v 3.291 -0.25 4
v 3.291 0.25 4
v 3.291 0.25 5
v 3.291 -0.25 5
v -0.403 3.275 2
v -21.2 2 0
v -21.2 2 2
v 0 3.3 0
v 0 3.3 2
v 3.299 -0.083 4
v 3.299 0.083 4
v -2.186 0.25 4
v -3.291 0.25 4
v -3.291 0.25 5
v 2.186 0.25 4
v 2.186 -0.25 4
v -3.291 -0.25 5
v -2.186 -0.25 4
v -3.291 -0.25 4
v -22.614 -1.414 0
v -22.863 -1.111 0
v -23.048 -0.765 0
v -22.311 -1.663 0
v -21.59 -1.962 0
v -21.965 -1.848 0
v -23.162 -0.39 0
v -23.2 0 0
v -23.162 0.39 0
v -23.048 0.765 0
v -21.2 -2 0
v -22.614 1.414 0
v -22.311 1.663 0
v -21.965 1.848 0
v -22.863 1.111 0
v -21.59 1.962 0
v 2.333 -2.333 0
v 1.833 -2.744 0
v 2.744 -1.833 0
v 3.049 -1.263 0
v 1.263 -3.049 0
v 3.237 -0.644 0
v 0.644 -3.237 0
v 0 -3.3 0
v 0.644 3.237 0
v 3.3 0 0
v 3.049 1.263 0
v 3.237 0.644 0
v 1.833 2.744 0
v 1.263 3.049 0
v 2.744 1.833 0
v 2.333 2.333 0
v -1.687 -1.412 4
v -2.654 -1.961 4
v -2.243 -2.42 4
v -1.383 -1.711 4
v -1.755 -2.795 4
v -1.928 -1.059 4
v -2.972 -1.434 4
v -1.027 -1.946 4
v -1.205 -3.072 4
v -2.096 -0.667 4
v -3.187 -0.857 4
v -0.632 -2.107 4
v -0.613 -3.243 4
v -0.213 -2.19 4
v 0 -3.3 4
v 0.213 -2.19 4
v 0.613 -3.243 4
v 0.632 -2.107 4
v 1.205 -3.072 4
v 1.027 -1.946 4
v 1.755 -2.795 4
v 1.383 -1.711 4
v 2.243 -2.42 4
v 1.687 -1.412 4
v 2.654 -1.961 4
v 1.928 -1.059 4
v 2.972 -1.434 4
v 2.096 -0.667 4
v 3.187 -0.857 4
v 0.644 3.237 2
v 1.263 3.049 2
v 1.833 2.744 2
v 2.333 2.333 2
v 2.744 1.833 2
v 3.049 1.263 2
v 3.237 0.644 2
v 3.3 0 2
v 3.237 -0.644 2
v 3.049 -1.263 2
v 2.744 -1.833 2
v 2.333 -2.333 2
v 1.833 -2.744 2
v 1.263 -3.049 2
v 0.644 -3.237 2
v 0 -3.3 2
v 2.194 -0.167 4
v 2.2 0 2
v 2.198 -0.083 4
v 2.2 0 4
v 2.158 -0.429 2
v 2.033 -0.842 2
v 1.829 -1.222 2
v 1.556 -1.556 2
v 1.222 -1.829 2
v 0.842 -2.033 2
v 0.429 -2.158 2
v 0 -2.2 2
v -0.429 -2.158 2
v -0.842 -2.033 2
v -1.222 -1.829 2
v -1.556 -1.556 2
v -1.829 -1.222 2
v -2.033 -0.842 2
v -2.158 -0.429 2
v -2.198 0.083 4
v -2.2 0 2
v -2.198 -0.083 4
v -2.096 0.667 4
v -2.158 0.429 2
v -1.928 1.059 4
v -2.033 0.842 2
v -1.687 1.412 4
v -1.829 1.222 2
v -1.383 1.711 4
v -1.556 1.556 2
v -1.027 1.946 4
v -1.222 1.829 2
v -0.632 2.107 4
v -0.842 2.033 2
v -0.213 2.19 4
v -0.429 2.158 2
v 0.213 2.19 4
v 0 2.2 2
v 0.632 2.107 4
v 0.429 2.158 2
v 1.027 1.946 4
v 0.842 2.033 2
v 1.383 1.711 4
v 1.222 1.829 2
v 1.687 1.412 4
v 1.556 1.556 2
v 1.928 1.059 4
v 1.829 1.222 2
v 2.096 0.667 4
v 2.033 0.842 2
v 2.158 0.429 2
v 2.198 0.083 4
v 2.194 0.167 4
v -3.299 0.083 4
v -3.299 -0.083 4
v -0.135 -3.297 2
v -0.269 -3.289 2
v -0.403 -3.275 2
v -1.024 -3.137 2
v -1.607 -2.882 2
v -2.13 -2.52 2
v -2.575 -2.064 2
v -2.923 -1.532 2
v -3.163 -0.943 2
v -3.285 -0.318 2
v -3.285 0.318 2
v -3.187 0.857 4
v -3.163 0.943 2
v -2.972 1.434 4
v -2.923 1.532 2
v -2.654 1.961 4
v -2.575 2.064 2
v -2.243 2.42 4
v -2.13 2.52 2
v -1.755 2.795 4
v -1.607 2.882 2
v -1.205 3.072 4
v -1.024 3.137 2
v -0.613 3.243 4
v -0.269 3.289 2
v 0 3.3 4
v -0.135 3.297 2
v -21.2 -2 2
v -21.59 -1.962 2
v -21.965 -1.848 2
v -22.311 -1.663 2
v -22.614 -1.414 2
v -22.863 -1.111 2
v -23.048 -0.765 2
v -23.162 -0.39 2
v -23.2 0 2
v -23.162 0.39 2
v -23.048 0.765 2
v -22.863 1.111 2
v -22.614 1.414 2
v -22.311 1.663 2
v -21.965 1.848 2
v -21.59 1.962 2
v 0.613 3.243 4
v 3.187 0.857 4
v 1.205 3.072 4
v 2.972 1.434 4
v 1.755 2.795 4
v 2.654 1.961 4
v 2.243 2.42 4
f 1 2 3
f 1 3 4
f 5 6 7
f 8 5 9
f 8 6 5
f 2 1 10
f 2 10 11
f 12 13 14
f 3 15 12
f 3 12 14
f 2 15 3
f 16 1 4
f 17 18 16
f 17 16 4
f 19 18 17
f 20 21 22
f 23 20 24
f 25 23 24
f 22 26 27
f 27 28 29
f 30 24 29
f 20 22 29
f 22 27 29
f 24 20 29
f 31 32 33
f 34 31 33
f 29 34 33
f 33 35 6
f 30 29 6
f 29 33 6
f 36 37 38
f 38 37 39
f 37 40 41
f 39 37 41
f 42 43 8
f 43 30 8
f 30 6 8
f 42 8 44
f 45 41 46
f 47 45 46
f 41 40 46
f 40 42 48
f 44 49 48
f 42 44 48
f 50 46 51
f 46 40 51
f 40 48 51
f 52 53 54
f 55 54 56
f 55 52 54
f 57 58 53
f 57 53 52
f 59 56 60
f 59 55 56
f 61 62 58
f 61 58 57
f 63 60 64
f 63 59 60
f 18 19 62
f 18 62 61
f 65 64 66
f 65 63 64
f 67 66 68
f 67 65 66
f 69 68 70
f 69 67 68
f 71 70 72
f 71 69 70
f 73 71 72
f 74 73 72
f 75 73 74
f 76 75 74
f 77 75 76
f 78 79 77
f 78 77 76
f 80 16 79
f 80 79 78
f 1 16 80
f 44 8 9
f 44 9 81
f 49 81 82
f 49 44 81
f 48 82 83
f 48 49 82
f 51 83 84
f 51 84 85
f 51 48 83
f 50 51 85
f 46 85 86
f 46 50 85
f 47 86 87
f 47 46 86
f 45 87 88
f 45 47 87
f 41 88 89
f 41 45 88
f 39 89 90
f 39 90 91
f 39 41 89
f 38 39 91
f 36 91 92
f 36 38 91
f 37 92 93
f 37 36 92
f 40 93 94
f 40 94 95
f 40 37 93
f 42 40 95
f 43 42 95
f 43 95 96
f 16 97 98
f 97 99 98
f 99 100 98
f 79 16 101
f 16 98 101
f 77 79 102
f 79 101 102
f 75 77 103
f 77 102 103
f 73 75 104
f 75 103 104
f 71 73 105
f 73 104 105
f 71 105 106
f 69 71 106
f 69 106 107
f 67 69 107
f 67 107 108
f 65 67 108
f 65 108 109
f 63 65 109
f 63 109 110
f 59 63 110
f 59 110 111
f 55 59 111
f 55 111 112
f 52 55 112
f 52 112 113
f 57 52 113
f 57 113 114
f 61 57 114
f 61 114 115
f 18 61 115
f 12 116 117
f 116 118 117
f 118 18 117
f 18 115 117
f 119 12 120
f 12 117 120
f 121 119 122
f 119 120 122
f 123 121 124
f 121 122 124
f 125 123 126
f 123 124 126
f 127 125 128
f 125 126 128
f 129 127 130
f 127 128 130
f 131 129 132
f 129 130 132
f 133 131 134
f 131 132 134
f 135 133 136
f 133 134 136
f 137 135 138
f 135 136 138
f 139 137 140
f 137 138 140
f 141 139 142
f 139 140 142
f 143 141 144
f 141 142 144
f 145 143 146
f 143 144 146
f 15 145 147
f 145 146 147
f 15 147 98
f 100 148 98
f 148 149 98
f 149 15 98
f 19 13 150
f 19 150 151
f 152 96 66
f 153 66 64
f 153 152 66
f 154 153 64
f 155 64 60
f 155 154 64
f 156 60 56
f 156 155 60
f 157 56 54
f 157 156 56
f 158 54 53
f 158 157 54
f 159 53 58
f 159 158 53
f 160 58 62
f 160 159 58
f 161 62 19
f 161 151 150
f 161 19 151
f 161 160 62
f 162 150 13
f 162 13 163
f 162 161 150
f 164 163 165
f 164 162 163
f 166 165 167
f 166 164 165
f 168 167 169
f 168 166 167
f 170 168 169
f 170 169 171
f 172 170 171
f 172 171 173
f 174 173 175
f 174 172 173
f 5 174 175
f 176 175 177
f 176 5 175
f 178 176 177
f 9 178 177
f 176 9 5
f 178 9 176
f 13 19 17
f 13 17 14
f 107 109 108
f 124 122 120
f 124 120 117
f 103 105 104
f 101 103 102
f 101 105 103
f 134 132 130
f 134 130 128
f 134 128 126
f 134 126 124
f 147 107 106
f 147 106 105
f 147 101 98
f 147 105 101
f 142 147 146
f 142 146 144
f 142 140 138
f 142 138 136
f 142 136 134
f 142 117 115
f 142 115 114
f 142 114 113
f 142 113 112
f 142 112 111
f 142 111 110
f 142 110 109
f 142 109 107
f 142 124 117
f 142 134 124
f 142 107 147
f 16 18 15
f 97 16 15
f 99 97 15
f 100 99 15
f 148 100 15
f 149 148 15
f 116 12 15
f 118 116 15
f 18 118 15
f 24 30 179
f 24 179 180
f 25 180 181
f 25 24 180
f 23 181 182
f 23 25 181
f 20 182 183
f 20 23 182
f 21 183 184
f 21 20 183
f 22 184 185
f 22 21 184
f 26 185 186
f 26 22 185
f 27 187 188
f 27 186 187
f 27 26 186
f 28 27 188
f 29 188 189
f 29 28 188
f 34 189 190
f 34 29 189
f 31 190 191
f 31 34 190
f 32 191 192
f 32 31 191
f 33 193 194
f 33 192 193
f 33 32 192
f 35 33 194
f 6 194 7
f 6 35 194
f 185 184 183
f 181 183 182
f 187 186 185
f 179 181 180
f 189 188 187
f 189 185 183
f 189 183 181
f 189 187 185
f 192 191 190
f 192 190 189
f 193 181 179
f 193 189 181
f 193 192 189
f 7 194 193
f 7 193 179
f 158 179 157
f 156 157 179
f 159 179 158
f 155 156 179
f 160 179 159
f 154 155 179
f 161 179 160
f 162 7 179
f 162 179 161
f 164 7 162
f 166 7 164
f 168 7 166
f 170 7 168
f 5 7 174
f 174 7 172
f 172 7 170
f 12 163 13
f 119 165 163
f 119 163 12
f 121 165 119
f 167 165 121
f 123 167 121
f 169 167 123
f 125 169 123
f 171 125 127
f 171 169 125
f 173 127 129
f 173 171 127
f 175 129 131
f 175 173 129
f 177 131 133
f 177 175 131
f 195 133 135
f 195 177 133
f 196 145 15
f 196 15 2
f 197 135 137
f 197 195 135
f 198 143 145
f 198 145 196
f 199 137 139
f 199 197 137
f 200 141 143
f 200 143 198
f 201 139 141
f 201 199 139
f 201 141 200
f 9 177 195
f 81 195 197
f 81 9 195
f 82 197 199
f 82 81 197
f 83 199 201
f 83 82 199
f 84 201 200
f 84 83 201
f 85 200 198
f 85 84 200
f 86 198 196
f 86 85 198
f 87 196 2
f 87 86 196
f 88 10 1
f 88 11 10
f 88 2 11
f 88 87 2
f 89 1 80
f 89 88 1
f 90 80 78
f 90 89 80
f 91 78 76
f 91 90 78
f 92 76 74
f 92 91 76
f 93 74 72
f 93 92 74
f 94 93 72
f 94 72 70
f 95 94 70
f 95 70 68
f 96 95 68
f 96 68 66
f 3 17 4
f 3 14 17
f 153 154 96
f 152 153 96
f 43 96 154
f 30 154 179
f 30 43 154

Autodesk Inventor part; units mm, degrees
ref_plane "YZ Plane" through (0, 0, 0) normal (1, 0, 0) x (0, 1, 0)
ref_plane "XZ Plane" through (0, 0, 0) normal (0, 1, 0) x (-1, 0, 0)
ref_plane "XY Plane" through (0, 0, 0) normal (0, 0, 1) x (1, 0, 0)
sketch "Sketch1" plane through (0, 0, 0) normal (0, 0, 1) x (1, 0, 0)
  circle A0 centre (0, 0) radius 3.3
  circle A1 centre (-21.2, 0) radius 2
  line L0 (-21.2, 2) -> (0, 3.3)
  line L1 (0, -3.3) -> (-21.2, -2)
  dimension "d0" = 6.6
  dimension "d1" = 4
  dimension "d2" = 21.2
extrude "Extrusion1" add sketch "Sketch1" along normal blind 2 contours A0 L1 L0 | A0 L1 A1 L0 | A1
sketch "Sketch2" plane through (0, 0, 2) normal (0, 0, 1) x (1, 0, 0)
  arc A0 (0, -3.3) -> (0, 3.3) centre (0, 0) ccw projected
  circle A1 centre (0, 0) radius 3.3
  circle A2 centre (0, 0) radius 2.2
  dimension "d5" = 4.4
sketch "Sketch2 outline for Extrusion2" plane through (0, 0, 2) normal (0, 0, 1) x (1, 0, 0)
  arc A0 (0, 3.3) -> (0, -3.3) centre (0, 0) ccw
  arc A1 (0, -3.3) -> (0, 3.3) centre (0, 0) ccw
  circle A2 centre (0, 0) radius 2.2
extrude "Extrusion2" add sketch "Sketch2 outline for Extrusion2" along normal blind 2
sketch "Sketch3" plane through (0, 0, 4) normal (0, 0, 1) x (1, 0, 0)
  arc A0 (-0.403201, 3.275275) -> (-0.403201, -3.275275) centre (0, 0) ccw
  arc A1 (0, -3.3) -> (0, 3.3) centre (0, 0) ccw
  line L0 (-3.290517, 0.25) -> (3.290517, 0.25)
  line L1 (3.290517, 0.25) -> (3.290517, -0.25)
  line L2 (3.290517, -0.25) -> (-3.290517, -0.25)
  line L3 (-3.290517, -0.25) -> (-3.290517, 0.25)
  dimension "d8" = 0.25
  dimension "d9" = 0.25
extrude "Extrusion3" add sketch "Sketch3" along normal blind 1 contours L0 L1 L2 L3
properties part number "servo-swap"
